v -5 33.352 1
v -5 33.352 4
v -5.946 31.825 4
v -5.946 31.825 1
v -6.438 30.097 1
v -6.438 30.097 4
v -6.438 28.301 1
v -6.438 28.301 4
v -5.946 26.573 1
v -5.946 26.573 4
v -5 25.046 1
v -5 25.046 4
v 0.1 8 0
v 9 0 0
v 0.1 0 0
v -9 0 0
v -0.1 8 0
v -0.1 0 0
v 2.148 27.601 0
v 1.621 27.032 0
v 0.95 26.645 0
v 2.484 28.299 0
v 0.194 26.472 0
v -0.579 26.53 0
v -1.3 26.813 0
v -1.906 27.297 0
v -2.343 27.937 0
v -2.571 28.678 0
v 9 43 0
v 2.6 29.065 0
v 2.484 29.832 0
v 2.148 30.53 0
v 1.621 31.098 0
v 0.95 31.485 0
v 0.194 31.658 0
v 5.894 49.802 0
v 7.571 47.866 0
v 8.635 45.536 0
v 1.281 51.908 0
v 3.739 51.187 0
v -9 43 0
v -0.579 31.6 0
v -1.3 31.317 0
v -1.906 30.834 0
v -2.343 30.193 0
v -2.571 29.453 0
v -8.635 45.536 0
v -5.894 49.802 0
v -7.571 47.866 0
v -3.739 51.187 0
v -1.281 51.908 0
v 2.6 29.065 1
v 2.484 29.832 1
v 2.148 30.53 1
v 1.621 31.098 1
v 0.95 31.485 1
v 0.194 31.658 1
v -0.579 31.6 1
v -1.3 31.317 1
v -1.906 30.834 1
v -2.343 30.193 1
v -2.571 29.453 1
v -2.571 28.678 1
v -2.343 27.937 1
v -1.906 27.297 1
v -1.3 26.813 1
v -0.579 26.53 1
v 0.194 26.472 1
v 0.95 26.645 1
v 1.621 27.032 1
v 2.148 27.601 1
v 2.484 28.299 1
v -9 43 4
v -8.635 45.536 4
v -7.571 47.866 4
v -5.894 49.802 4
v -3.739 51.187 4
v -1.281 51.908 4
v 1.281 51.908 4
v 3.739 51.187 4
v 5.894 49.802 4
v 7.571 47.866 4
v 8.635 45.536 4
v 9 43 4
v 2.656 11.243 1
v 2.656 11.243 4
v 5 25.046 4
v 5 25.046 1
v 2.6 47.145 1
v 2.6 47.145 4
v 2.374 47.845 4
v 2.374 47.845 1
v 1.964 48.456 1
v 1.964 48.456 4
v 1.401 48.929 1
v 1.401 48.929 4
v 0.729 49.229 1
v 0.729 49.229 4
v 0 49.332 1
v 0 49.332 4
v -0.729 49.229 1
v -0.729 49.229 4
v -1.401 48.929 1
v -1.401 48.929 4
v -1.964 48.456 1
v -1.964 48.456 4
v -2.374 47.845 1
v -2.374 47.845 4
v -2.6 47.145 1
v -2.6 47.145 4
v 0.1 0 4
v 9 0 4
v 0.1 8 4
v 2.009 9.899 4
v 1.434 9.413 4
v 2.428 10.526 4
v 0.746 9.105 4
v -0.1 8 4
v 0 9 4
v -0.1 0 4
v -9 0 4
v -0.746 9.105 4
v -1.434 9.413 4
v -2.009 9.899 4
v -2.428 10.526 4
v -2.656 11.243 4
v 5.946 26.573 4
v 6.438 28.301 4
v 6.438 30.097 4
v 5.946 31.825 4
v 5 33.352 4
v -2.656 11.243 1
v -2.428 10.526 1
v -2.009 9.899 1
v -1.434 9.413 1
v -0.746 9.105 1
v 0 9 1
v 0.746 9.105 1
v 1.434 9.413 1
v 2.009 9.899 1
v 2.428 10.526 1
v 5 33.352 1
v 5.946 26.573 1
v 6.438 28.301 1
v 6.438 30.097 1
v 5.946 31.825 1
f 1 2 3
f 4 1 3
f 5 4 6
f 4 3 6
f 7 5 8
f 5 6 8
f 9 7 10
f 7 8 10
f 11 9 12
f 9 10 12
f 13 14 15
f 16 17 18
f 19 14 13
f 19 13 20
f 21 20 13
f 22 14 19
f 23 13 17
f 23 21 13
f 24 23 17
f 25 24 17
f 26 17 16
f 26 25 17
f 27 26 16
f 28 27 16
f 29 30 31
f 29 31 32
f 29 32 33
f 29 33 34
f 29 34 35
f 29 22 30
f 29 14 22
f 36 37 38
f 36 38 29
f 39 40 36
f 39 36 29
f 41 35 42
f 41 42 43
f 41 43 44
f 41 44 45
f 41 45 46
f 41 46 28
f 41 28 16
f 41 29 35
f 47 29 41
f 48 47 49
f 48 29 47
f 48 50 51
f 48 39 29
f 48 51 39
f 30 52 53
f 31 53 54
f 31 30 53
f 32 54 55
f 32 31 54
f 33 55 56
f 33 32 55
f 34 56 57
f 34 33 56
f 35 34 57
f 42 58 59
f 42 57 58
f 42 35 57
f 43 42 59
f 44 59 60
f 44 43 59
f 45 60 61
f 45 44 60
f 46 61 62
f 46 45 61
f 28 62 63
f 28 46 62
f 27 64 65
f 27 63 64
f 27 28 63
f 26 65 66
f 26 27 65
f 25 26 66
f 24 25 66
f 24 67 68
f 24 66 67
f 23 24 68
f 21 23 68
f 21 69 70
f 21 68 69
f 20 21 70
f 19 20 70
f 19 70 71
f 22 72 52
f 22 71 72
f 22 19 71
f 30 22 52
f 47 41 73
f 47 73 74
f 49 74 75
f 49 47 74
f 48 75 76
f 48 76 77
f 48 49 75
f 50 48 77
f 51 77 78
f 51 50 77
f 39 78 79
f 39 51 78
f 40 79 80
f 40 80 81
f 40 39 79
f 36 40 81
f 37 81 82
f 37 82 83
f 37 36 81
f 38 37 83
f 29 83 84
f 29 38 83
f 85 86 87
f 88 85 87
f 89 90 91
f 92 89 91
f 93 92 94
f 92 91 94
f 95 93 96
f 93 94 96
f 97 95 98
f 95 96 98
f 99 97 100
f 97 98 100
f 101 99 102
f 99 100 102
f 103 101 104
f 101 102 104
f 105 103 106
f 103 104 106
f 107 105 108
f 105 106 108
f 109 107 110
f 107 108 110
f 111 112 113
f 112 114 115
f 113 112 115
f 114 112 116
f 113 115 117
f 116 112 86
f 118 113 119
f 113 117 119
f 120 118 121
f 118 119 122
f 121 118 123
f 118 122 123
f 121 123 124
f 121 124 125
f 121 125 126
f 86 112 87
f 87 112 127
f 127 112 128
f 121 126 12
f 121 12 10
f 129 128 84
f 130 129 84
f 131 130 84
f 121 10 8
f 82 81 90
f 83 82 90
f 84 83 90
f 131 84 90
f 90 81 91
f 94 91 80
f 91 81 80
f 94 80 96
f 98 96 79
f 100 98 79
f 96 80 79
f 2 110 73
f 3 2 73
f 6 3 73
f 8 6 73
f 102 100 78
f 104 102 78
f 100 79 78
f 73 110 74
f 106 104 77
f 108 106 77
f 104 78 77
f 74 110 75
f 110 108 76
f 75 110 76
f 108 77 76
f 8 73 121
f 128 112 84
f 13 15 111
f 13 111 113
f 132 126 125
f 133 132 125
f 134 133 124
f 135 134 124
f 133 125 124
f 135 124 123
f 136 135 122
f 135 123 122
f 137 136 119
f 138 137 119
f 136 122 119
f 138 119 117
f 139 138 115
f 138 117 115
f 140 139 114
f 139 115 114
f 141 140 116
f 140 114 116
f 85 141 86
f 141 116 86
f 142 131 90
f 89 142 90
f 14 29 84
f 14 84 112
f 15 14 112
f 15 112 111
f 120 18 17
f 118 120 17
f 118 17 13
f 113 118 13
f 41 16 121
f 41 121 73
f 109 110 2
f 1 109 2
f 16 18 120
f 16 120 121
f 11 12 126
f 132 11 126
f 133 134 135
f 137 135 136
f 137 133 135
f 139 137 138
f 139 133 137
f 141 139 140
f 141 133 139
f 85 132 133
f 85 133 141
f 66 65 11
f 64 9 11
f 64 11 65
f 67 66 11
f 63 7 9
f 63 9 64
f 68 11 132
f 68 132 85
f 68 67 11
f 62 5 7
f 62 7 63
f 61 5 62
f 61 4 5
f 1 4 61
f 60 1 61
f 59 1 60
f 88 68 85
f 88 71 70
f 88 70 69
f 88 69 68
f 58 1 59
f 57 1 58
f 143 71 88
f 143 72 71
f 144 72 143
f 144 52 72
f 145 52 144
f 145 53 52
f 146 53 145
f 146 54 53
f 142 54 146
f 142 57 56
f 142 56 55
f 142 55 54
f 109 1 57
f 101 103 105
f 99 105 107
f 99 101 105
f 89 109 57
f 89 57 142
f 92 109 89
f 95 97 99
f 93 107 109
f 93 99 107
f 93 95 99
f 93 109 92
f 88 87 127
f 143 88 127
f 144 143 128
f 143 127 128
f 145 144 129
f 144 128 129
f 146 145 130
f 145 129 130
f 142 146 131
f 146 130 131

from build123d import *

# Parameters (mm, degrees)
EXTRUDE_1_DEPTH          = 4
CUT_EXTRUDE_1_DEPTH      = 3
SKETCH_4_R               = 2.6
CUT_EXTRUDE_9_DEPTH      = 19
CUT_EXTRUDE_9_DEPTH_BACK = 2
SKETCH_5_W               = 0.2
SKETCH_5_H               = 8
CUT_EXTRUDE_11_DEPTH     = 5


with BuildPart() as part:
    # 草圖1 → 填料-伸長1 (new body)
    with BuildSketch(Plane.XY):
        with BuildLine():
            Line((-9, 0), (-9, 43))
            ThreePointArc((-9, 43), (0, 52), (9, 43))
            Line((9, 43), (9, 0))
            Line((9, 0), (-9, 0))
        make_face()
    extrude(amount=EXTRUDE_1_DEPTH)

    # 草圖2 → 除料-伸長1 (cut)
    with BuildSketch(Plane.XY.offset(4)):
        with BuildLine():
            Line((-2.6, 47.145110573), (-5, 33.352358854))
            ThreePointArc((-5, 33.352358854), (-6.5, 29.199046922), (-5, 25.045734991))
            Line((-5, 25.045734991), (-2.656326538, 11.243300615))
            ThreePointArc((-2.656326538, 11.243300615), (0, 9), (2.656326538, 11.243300615))
            Line((2.656326538, 11.243300615), (5, 25.045734991))
            ThreePointArc((5, 25.045734991), (6.5, 29.199046922), (5, 33.352358854))
            Line((5, 33.352358854), (2.6, 47.145110573))
            ThreePointArc((2.6, 47.145110573), (0, 49.331766334), (-2.6, 47.145110573))
        make_face()
    extrude(amount=-CUT_EXTRUDE_1_DEPTH, mode=Mode.SUBTRACT)

    # 草圖4 → 除料-伸長9 (cut, two sides)
    with BuildSketch(Plane.XY) as cut_extrude_9_sk:
        with Locations((0, 29.065156497)):
            Circle(SKETCH_4_R)
    extrude(amount=CUT_EXTRUDE_9_DEPTH, mode=Mode.SUBTRACT)
    extrude(cut_extrude_9_sk.sketch, amount=-CUT_EXTRUDE_9_DEPTH_BACK, mode=Mode.SUBTRACT)

    # 草圖5 → 除料-伸長11 (cut, through all)
    with BuildSketch(Plane.XY):
        with Locations((0, 4)):
            Rectangle(SKETCH_5_W, SKETCH_5_H)
    extrude(amount=CUT_EXTRUDE_11_DEPTH, mode=Mode.SUBTRACT)


solid = part.part
